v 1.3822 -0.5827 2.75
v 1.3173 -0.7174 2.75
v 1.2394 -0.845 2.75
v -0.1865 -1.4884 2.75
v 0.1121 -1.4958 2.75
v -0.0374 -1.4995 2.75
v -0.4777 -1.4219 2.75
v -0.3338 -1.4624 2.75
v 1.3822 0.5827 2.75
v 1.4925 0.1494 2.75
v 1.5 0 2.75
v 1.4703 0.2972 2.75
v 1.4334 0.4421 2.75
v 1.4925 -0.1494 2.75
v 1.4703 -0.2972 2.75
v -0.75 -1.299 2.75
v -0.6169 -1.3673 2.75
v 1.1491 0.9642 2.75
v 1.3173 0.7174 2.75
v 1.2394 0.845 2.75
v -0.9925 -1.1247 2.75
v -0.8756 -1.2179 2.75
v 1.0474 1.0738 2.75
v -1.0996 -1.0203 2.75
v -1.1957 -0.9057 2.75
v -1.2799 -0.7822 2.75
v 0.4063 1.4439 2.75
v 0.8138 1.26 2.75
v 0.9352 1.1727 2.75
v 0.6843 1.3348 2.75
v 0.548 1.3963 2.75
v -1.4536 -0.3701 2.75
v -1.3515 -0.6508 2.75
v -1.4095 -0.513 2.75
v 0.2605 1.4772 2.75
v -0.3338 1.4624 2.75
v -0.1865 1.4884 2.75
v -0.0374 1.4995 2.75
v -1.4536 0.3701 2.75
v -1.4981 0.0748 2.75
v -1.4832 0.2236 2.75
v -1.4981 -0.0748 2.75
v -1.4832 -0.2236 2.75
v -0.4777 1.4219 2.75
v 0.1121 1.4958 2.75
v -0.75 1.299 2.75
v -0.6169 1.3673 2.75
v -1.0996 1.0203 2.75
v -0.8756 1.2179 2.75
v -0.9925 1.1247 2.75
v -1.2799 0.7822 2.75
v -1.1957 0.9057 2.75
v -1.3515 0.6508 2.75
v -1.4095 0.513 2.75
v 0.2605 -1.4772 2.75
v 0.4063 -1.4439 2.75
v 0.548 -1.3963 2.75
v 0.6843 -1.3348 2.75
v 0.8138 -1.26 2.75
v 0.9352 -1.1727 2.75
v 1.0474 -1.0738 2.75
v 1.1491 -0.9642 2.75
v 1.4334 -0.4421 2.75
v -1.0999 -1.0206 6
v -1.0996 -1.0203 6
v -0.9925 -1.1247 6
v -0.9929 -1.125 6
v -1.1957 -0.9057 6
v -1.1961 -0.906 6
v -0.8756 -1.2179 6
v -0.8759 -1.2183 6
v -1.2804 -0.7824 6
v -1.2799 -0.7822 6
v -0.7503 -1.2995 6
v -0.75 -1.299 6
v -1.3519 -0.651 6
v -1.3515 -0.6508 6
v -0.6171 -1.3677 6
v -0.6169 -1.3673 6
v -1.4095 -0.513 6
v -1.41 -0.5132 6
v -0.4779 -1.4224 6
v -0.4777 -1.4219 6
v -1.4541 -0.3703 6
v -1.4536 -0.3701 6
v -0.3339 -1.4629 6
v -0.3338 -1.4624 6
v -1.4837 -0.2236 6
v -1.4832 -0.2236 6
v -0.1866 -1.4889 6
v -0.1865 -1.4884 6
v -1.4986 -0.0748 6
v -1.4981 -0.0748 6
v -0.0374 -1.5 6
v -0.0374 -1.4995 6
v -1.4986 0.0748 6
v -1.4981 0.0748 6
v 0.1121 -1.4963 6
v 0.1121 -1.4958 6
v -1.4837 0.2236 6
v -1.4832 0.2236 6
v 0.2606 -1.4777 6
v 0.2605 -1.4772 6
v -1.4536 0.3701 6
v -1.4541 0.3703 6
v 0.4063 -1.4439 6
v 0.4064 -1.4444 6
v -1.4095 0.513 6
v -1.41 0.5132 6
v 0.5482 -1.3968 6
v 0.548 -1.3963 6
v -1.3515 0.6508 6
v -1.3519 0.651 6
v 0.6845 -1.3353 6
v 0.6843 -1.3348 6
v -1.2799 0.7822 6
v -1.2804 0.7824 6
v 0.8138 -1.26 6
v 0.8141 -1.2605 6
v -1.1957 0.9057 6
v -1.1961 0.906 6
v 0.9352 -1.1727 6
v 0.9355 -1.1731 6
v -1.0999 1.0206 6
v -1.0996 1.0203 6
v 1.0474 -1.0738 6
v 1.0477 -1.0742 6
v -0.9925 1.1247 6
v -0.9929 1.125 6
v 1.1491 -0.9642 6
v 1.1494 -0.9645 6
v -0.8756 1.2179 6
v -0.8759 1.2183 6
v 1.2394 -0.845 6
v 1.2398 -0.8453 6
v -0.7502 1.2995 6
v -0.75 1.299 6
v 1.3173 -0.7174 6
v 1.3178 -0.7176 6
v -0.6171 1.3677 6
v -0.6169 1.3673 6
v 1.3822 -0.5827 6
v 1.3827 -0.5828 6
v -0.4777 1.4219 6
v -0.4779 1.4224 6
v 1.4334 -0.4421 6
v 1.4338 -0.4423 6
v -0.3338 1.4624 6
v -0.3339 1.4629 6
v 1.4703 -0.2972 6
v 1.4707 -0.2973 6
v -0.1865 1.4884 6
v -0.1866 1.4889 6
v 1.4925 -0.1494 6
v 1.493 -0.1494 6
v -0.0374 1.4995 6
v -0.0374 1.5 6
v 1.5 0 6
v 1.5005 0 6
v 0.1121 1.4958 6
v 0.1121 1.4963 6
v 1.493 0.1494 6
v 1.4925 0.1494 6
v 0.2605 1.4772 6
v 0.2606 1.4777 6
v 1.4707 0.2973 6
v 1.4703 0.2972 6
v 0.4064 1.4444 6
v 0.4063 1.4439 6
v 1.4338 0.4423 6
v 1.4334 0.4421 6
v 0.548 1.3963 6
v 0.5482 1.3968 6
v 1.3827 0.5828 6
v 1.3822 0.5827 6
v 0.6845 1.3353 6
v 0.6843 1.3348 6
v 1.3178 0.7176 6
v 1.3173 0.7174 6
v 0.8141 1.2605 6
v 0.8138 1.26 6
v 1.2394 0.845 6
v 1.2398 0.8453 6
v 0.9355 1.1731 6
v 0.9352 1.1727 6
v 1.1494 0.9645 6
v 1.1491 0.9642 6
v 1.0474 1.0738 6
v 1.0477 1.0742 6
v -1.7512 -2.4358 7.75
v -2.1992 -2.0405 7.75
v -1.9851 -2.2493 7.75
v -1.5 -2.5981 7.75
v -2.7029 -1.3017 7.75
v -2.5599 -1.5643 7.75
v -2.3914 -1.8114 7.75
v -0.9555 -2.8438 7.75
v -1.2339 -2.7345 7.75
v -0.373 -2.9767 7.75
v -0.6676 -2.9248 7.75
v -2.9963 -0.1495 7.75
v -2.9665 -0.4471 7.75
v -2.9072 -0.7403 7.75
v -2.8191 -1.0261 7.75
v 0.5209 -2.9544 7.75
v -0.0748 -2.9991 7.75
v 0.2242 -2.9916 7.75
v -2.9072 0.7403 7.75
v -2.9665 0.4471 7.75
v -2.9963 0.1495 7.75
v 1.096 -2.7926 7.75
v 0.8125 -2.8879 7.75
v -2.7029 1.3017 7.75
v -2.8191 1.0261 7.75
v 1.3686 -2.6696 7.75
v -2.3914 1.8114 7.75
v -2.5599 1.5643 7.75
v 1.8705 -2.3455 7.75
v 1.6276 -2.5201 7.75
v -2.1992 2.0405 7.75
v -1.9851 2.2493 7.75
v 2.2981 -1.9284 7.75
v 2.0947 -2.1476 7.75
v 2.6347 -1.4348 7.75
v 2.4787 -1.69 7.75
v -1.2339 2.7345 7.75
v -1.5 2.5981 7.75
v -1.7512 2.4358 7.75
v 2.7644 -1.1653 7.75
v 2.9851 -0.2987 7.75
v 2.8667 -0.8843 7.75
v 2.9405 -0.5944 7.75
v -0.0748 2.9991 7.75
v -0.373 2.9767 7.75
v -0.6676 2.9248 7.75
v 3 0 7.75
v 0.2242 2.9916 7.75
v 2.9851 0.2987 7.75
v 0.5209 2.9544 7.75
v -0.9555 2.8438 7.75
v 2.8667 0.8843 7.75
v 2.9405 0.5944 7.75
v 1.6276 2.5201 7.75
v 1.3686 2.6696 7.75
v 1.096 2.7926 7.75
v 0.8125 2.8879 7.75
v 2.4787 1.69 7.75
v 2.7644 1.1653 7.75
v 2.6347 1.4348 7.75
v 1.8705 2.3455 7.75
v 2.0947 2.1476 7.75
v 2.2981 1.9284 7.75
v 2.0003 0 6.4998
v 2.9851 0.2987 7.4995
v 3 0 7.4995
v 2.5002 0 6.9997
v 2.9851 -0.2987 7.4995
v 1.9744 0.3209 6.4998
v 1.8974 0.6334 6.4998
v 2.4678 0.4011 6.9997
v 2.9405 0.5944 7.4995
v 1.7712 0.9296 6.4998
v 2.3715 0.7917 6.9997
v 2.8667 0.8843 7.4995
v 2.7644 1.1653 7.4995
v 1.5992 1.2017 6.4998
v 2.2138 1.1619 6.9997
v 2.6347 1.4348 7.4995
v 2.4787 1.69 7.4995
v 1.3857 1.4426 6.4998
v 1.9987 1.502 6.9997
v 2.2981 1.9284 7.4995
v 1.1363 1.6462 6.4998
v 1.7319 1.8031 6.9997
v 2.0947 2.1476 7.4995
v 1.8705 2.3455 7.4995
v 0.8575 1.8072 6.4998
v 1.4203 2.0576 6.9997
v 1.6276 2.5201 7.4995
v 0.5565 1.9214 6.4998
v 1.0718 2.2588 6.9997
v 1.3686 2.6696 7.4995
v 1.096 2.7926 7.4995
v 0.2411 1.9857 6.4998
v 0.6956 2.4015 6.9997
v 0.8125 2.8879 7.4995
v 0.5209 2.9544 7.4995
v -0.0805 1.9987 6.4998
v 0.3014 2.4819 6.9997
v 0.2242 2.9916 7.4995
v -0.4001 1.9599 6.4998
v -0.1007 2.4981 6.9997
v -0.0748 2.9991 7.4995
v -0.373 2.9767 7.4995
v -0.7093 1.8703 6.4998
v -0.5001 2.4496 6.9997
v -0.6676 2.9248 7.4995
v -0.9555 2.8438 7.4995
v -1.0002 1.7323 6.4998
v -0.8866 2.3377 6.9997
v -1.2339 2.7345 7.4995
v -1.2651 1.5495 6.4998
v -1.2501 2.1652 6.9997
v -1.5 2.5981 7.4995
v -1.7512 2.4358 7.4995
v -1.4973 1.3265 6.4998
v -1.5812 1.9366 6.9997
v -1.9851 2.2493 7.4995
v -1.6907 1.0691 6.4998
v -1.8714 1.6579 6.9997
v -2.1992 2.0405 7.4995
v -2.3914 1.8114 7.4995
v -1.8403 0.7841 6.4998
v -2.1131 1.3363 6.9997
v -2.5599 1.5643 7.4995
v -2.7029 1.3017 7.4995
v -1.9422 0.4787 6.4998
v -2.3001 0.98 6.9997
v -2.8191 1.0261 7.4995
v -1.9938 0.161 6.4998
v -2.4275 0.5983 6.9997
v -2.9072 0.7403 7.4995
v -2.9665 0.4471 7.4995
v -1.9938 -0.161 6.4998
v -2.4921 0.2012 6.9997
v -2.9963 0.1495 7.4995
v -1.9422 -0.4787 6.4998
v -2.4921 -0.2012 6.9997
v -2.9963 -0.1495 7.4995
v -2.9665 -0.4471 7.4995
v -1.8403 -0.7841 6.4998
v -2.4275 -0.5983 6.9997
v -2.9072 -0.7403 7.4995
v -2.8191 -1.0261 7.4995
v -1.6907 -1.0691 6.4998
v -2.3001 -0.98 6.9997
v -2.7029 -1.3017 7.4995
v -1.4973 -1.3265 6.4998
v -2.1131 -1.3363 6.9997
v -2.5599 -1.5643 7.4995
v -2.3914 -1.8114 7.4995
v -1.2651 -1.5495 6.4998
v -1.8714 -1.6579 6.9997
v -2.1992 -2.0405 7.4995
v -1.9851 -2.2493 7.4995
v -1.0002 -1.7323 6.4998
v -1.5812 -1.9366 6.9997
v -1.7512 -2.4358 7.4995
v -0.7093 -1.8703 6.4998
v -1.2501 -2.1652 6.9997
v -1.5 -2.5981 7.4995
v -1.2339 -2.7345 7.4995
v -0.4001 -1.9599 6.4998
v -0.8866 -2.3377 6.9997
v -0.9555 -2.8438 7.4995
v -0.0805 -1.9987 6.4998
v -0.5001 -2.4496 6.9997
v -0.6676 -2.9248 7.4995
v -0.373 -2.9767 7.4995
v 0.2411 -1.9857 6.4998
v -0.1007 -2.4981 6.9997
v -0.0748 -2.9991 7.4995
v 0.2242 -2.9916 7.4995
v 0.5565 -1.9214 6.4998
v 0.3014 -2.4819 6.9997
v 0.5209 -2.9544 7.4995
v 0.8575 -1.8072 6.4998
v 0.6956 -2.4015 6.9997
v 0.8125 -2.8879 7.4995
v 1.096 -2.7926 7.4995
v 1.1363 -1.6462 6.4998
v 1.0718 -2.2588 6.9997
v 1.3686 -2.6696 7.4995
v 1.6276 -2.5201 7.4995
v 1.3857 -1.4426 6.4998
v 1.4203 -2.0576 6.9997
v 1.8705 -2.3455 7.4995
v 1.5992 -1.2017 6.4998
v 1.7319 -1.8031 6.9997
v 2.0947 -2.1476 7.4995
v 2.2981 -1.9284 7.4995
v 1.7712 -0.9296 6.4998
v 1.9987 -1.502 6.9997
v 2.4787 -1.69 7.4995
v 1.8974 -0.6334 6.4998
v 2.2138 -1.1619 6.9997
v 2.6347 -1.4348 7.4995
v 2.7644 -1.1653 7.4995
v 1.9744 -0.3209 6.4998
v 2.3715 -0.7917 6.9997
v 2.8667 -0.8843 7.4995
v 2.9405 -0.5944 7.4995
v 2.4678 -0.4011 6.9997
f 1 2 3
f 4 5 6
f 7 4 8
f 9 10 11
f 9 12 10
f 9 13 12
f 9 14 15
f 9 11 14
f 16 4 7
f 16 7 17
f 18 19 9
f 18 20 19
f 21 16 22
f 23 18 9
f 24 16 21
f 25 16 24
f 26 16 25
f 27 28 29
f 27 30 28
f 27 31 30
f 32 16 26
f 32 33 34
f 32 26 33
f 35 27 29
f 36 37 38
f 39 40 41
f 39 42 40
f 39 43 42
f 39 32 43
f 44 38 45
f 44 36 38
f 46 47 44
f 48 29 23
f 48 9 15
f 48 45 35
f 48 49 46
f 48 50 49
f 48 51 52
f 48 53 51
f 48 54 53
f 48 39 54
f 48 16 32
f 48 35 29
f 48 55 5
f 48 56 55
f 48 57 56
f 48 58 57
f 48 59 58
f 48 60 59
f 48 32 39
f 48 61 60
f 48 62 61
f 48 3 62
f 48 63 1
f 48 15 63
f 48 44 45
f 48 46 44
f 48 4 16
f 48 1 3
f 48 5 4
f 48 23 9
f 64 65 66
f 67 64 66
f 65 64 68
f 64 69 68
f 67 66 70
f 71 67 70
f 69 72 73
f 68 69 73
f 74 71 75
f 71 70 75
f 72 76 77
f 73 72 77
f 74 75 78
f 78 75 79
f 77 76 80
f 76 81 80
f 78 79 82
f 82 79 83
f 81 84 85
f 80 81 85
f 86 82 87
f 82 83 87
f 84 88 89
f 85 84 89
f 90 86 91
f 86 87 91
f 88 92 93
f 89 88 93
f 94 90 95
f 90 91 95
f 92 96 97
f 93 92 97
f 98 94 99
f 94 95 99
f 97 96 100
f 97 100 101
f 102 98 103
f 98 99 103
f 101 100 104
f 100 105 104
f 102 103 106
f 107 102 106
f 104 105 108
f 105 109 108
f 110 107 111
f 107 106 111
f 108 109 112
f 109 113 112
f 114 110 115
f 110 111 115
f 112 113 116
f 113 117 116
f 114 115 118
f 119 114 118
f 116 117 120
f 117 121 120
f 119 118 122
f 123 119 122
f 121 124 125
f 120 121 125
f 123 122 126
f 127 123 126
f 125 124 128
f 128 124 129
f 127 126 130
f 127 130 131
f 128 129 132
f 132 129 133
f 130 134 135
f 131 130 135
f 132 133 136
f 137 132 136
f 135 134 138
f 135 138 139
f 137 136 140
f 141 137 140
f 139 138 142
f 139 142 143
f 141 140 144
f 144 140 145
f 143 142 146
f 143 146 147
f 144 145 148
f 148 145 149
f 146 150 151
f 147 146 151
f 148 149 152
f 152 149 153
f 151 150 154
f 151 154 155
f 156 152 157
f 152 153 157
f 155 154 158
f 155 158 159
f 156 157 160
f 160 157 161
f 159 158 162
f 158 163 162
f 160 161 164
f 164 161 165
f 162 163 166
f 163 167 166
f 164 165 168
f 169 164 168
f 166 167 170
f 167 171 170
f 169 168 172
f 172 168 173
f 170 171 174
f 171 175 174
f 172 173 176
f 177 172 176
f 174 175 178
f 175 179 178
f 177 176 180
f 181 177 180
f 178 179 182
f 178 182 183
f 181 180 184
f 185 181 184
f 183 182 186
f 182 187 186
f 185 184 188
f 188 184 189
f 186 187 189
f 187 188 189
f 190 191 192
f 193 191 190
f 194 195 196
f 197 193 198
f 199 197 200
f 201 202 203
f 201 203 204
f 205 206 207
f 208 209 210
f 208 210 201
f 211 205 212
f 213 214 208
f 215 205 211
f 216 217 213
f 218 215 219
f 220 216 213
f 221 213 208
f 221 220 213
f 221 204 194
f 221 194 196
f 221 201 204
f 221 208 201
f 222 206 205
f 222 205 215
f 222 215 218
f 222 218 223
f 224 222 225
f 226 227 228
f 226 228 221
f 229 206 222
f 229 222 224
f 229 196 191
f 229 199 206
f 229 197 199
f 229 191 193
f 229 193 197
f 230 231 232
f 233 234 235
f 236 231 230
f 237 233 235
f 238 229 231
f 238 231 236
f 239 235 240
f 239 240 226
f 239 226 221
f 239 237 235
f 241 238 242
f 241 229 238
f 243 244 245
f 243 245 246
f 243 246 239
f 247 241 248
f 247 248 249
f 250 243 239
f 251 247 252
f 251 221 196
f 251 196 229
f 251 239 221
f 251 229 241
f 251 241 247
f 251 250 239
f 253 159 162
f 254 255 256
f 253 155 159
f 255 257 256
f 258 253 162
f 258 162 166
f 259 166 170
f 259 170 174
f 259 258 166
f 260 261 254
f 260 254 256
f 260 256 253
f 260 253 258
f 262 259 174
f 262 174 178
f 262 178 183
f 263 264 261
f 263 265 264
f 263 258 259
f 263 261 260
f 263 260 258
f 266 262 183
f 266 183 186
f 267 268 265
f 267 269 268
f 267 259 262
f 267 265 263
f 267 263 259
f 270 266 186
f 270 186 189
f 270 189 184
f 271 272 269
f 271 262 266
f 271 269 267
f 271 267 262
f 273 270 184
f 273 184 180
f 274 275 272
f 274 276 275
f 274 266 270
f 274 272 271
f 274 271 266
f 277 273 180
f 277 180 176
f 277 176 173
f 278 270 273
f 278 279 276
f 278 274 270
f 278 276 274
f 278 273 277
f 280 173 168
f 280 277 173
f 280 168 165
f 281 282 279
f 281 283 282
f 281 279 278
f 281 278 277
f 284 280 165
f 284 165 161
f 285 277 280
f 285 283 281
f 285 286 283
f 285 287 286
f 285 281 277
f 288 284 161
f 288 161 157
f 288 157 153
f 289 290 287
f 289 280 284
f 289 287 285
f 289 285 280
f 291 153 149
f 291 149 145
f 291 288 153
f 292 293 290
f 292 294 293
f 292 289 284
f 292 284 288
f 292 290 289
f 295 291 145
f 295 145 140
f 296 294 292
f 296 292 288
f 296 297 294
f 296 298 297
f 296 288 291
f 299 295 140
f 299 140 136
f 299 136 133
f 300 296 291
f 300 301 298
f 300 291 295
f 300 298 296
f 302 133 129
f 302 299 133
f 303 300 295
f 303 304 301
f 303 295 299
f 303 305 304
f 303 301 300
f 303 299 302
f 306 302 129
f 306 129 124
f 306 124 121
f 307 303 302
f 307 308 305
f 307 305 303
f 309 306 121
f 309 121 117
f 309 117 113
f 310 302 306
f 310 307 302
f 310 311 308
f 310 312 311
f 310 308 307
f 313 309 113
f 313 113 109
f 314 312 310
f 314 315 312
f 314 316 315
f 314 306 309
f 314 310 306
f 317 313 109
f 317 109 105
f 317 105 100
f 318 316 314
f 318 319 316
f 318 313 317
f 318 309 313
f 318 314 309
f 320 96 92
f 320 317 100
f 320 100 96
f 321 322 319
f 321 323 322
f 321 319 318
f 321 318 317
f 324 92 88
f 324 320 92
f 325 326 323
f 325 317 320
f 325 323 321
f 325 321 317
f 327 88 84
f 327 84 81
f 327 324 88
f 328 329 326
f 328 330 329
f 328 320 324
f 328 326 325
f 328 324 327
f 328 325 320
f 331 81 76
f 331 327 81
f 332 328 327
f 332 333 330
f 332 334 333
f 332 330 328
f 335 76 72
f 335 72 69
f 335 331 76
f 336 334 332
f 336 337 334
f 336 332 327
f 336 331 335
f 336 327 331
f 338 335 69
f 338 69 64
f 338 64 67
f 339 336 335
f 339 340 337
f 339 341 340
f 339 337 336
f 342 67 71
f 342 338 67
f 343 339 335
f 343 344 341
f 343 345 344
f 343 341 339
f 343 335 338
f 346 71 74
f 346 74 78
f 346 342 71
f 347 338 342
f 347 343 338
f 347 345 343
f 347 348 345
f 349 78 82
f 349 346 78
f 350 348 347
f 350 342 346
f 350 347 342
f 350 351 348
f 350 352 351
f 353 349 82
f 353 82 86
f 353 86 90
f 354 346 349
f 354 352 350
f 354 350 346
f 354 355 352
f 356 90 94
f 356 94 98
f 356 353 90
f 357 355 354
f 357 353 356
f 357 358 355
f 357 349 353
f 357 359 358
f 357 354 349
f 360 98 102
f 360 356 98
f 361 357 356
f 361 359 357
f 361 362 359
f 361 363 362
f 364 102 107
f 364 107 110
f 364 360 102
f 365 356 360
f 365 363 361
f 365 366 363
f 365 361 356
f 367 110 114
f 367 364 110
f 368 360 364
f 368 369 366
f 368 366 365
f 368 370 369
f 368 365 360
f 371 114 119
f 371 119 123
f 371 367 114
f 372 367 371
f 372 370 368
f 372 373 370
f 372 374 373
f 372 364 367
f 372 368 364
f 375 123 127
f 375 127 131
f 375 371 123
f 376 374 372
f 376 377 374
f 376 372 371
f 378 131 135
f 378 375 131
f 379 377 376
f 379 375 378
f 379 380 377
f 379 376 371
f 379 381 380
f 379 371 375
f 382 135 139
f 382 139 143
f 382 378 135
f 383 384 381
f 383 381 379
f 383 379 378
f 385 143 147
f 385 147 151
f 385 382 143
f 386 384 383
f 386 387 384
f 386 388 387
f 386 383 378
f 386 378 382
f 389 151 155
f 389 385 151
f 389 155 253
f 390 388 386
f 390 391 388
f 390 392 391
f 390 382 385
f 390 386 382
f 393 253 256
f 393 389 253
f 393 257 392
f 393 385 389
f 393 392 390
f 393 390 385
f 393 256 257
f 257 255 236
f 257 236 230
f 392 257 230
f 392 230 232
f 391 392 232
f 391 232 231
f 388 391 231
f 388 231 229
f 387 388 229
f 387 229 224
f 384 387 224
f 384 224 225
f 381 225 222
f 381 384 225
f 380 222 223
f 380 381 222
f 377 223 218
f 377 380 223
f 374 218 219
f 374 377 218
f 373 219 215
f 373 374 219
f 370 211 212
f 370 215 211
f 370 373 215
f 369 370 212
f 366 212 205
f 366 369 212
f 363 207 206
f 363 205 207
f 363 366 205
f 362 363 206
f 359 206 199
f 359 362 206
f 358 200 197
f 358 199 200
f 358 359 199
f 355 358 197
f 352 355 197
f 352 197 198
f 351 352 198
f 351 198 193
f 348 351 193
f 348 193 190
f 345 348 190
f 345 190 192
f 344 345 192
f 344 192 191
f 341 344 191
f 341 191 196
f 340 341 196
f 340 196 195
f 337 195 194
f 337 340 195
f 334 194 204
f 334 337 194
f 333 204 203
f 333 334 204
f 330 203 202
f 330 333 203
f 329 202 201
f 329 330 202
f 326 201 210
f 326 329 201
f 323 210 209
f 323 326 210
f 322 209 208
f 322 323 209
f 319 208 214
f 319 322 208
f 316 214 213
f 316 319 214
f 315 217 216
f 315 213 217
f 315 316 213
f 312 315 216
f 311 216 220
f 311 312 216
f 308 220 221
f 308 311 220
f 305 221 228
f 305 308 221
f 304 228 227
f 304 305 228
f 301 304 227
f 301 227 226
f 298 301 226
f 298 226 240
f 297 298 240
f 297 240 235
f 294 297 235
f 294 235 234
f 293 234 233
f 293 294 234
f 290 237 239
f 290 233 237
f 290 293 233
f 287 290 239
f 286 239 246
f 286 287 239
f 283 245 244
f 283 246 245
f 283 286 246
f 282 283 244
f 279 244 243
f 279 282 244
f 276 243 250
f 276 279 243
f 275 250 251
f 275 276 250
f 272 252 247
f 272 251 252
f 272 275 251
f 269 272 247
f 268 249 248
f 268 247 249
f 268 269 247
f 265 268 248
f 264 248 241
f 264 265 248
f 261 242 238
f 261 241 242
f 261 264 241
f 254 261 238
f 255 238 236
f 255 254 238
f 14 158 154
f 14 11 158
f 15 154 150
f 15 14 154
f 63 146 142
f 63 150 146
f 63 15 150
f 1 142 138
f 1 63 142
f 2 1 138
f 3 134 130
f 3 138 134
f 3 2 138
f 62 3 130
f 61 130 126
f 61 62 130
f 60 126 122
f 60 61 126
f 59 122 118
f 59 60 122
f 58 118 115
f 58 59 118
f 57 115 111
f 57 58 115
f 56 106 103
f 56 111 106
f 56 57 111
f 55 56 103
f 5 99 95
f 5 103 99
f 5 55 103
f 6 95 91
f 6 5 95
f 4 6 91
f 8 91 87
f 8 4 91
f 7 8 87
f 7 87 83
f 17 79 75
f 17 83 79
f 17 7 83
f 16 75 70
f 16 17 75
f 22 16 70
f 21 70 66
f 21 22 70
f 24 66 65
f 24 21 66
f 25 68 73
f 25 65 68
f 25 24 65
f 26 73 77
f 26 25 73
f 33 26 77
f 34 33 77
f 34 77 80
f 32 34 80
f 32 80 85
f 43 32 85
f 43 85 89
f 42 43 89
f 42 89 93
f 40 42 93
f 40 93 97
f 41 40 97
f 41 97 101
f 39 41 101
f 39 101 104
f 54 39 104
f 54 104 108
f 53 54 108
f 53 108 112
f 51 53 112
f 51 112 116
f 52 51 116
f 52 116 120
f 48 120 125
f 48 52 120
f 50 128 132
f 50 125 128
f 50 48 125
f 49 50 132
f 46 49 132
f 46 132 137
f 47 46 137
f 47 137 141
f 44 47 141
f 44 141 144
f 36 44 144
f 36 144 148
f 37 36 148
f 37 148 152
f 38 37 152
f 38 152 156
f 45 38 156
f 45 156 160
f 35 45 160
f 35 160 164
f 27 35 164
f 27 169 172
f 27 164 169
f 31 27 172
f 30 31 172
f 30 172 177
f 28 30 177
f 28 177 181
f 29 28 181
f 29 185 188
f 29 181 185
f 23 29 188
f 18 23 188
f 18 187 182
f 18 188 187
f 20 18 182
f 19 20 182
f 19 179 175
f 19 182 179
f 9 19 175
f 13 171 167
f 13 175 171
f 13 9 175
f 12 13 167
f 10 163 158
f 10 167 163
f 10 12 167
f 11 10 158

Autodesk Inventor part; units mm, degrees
ref_plane "YZ Plane" through (0, 0, 0) normal (1, 0, 0) x (0, 1, 0)
ref_plane "XZ Plane" through (0, 0, 0) normal (0, 1, 0) x (-1, 0, 0)
ref_plane "XY Plane" through (0, 0, 0) normal (0, 0, 1) x (1, 0, 0)
sketch "スケッチ1" plane through (0, 0, 0) normal (0, 0, 1) x (1, 0, 0)
  circle A0 centre (0, 0) radius 1.5
  dimension "d0" = 3
extrude "押し出し1" add sketch "スケッチ1" along normal blind 6
sketch "スケッチ2" plane through (0, 0, 6) normal (0, 0, 1) x (1, 0, 0)
  circle A0 centre (0, 0) radius 1.5 projected
  circle A1 centre (0, 0) radius 3
  dimension "d3" = 6
extrude "押し出し2" add sketch "スケッチ2" along normal blind 1.75 contours A0 | A1
thread "ねじ1" size "M3x0.5" class "6g" standard "ANSI Metric M Profile" full length
chamfer "面取り1" distance 1.5 angle 45 1 edges at (-3, 0, 6)
sketch "スケッチ4" plane through (0, 0, 0) normal (0, 0, -1) x (-1, 0, 0)
  circle A0 centre (0, 0) radius 1.5 projected
extrude "押し出し4" cut sketch "スケッチ4" against normal blind 2
sketch "スケッチ5" plane through (0, 0, 2) normal (0, 0, -1) x (-1, 0, 0)
  circle A0 centre (0, 0) radius 1.5 projected
extrude "押し出し5" cut sketch "スケッチ5" against normal blind 0.75
properties part number "SB　5mm皿ネジ" material "Steel, Mild"
